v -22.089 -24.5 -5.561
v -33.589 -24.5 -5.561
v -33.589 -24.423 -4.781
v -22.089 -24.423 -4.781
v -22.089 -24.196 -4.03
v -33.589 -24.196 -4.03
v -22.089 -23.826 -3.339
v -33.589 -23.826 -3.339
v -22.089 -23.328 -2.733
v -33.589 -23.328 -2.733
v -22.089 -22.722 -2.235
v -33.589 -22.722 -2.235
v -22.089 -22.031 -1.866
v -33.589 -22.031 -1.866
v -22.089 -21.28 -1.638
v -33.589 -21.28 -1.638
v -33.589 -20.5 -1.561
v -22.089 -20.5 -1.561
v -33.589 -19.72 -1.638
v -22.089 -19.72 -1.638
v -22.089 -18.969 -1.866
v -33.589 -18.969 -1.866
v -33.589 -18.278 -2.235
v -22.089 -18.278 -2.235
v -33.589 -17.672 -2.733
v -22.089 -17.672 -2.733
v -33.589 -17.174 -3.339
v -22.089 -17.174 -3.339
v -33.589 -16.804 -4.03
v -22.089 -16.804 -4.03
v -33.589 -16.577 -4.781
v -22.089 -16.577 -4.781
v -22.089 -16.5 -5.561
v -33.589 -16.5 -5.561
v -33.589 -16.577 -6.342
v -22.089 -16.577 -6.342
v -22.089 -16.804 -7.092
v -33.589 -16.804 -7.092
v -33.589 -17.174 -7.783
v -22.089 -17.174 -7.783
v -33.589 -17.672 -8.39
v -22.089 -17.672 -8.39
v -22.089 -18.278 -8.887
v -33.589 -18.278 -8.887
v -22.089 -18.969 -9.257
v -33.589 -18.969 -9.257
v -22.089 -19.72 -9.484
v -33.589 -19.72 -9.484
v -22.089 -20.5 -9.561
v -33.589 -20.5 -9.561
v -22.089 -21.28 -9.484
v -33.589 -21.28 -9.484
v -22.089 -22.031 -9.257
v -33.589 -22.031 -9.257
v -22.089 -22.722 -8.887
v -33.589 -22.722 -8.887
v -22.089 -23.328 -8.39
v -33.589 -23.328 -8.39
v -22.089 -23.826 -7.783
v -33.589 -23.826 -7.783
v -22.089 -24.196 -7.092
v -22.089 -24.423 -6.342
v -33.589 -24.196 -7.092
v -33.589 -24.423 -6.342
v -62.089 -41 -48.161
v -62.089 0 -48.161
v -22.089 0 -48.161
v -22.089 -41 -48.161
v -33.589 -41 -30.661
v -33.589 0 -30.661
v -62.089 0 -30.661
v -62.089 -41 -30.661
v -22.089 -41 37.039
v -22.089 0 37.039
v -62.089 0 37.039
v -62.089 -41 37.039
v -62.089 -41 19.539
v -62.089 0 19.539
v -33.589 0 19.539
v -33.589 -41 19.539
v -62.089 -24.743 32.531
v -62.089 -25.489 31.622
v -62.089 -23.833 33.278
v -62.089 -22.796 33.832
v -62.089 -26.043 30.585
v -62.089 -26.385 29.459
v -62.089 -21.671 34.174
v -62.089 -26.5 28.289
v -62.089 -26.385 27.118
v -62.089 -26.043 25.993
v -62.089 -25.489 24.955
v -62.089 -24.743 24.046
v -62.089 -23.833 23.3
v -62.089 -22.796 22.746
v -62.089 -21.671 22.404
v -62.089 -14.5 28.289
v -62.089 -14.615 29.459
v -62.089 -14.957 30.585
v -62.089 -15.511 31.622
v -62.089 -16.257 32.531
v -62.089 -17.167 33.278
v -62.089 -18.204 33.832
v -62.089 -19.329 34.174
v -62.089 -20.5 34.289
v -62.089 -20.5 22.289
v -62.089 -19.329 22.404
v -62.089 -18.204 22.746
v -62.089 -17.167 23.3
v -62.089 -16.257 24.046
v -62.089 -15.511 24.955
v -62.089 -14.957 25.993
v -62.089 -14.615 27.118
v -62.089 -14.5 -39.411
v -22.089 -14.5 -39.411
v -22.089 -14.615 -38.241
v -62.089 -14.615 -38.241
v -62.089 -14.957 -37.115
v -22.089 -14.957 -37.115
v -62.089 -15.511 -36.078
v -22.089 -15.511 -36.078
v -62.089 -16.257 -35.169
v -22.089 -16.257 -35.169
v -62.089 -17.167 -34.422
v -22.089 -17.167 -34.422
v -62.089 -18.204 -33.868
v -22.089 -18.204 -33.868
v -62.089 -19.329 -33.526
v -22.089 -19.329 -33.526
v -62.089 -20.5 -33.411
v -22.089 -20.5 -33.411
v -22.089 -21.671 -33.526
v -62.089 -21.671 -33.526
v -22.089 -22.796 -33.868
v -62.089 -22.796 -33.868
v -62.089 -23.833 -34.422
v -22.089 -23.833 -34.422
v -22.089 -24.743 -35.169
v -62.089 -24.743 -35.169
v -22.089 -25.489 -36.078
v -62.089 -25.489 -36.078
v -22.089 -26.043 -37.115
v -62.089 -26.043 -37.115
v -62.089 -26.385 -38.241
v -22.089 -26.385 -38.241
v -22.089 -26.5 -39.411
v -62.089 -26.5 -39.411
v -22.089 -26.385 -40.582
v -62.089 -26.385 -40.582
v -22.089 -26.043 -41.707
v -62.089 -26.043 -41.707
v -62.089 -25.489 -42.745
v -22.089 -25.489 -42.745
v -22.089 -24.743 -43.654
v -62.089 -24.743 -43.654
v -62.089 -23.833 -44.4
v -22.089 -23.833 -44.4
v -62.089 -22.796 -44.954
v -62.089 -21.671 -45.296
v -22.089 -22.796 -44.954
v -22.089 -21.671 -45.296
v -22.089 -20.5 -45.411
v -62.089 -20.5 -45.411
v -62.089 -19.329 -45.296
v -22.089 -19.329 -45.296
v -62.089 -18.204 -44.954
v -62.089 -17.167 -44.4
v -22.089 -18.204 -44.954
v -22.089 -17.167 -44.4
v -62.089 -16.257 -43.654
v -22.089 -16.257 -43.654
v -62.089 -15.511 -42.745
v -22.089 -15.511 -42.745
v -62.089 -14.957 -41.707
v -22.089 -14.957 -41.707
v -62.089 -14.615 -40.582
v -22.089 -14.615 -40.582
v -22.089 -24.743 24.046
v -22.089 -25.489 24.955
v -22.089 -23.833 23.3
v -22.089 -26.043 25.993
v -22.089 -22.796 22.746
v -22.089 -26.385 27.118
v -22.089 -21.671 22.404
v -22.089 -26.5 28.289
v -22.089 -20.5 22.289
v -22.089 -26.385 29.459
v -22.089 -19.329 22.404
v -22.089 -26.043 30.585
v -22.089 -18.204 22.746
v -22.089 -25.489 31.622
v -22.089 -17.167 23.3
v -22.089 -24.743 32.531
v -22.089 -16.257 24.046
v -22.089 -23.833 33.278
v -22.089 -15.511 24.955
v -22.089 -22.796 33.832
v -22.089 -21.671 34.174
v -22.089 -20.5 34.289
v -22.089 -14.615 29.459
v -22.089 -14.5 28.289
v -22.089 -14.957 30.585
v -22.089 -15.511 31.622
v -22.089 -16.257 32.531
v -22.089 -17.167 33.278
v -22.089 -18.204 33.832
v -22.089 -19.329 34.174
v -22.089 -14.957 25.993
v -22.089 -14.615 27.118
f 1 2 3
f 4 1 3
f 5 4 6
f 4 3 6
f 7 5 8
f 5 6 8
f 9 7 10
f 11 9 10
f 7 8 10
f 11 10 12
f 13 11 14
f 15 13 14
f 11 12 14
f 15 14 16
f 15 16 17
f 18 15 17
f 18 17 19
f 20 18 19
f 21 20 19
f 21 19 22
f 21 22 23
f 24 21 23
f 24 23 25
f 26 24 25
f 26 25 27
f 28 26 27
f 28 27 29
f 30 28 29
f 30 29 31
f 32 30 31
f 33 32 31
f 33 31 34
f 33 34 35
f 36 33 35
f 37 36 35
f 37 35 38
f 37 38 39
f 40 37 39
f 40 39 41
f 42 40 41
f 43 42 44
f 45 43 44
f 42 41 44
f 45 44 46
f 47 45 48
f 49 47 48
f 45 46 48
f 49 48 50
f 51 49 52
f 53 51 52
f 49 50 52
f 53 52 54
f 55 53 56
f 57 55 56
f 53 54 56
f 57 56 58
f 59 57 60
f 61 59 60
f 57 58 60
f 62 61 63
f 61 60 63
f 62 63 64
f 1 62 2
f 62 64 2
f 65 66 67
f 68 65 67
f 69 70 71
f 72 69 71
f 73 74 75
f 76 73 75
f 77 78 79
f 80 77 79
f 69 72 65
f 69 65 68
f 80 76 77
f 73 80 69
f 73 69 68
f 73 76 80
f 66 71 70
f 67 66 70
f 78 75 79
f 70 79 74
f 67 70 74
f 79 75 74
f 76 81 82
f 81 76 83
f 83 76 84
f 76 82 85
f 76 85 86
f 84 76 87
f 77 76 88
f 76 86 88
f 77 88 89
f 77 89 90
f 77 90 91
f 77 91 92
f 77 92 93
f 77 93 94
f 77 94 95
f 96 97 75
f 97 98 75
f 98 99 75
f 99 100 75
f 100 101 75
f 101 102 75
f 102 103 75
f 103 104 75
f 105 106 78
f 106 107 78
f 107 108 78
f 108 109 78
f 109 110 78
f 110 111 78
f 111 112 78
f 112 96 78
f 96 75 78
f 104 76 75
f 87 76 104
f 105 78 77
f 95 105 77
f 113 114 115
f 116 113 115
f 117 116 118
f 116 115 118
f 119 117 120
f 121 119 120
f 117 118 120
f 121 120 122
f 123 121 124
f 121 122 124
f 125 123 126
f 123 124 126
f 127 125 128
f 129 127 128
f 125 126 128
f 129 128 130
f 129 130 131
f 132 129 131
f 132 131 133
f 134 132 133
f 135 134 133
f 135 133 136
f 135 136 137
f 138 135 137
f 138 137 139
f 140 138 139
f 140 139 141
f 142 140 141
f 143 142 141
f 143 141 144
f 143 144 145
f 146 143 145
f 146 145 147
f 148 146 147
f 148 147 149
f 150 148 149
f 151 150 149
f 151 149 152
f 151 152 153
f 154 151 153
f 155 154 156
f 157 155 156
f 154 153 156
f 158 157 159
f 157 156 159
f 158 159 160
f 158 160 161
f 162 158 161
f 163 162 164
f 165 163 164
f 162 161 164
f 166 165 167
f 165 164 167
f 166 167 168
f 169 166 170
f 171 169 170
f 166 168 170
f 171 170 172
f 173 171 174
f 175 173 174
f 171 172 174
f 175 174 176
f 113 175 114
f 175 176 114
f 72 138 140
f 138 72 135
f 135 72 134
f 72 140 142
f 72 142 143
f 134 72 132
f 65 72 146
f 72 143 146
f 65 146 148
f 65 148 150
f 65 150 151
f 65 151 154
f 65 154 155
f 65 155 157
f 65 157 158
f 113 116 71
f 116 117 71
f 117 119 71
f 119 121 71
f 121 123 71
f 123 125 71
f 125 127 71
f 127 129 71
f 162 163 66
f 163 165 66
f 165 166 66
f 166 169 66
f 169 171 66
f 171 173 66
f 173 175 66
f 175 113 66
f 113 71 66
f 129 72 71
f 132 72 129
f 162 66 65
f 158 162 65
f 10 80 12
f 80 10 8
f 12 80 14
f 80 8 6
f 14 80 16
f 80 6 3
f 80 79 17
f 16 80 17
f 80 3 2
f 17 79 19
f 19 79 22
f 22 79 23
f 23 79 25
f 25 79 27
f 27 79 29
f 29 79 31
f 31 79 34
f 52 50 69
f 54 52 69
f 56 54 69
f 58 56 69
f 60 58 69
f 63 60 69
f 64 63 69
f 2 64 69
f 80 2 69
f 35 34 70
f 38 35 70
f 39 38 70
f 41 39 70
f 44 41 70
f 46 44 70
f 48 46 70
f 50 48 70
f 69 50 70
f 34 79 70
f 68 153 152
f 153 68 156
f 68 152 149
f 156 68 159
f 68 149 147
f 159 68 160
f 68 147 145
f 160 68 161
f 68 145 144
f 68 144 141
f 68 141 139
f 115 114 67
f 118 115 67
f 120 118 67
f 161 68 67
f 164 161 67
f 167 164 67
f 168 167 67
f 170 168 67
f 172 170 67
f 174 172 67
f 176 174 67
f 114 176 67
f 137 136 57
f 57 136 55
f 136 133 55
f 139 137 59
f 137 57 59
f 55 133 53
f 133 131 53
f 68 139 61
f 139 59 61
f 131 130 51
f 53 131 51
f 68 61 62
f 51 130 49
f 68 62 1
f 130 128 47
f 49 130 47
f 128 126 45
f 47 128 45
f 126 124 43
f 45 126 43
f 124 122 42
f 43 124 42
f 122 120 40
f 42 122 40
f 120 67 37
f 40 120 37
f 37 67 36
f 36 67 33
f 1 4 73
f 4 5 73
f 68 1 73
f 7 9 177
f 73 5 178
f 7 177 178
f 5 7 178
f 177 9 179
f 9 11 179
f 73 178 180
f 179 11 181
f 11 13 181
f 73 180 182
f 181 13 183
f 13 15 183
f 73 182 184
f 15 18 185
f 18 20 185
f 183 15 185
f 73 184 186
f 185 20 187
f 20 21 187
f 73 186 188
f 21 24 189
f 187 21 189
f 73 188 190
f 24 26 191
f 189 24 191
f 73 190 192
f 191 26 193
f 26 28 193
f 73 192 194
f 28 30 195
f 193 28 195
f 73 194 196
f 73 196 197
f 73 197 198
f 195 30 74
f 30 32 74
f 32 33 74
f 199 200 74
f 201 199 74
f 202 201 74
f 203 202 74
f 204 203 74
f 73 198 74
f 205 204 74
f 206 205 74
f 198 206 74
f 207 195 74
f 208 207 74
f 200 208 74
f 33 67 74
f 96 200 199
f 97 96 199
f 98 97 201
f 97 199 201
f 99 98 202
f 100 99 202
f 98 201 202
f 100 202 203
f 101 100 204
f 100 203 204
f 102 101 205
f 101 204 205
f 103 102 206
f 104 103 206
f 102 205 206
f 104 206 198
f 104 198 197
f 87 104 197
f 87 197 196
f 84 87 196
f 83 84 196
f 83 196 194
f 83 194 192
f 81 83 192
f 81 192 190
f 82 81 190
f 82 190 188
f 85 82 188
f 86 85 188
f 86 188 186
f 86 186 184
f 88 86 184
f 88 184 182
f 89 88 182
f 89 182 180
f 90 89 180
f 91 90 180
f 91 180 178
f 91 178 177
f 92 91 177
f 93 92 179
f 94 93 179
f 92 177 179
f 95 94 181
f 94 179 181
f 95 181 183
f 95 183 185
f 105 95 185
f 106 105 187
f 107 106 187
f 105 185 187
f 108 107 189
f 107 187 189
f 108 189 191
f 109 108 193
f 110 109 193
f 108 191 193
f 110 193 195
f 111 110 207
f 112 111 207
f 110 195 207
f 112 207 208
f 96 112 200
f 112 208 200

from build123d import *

# Parameters (mm, degrees)
F1_DEPTH = 41
F3_D     = 12
F5_D     = 12
F7_D     = 8


with BuildPart() as f1:
    # F0 (on Front) → F1 (new body)
    with BuildSketch(Plane.XZ):
        Polygon((-22.088847, 37.038844), (-62.088847, 37.038844), (-62.088847, 19.538844), (-33.588847, 19.538844), (-33.588847, -30.661156), (-62.088847, -30.661156), (-62.088847, -48.161156), (-22.088847, -48.161156), align=None)
    extrude(amount=F1_DEPTH)

    # F3 (through all)
    with Locations(Plane(origin=(-62.088847, 0, 0), x_dir=(0, -1, 0), z_dir=(-1, 0, 0))):
        with Locations((20.5, 28.288844)):
            Hole(F3_D / 2)

    # F5 (through all)
    with Locations(Plane(origin=(-62.088847, 0, 0), x_dir=(0, -1, 0), z_dir=(-1, 0, 0))):
        with Locations((20.5, -39.411156)):
            Hole(F5_D / 2)

    # F7 (through all)
    with Locations(Plane.YZ.offset(-22.088847)):
        with Locations((-20.5, -5.561156)):
            Hole(F7_D / 2)


solid = f1.part
